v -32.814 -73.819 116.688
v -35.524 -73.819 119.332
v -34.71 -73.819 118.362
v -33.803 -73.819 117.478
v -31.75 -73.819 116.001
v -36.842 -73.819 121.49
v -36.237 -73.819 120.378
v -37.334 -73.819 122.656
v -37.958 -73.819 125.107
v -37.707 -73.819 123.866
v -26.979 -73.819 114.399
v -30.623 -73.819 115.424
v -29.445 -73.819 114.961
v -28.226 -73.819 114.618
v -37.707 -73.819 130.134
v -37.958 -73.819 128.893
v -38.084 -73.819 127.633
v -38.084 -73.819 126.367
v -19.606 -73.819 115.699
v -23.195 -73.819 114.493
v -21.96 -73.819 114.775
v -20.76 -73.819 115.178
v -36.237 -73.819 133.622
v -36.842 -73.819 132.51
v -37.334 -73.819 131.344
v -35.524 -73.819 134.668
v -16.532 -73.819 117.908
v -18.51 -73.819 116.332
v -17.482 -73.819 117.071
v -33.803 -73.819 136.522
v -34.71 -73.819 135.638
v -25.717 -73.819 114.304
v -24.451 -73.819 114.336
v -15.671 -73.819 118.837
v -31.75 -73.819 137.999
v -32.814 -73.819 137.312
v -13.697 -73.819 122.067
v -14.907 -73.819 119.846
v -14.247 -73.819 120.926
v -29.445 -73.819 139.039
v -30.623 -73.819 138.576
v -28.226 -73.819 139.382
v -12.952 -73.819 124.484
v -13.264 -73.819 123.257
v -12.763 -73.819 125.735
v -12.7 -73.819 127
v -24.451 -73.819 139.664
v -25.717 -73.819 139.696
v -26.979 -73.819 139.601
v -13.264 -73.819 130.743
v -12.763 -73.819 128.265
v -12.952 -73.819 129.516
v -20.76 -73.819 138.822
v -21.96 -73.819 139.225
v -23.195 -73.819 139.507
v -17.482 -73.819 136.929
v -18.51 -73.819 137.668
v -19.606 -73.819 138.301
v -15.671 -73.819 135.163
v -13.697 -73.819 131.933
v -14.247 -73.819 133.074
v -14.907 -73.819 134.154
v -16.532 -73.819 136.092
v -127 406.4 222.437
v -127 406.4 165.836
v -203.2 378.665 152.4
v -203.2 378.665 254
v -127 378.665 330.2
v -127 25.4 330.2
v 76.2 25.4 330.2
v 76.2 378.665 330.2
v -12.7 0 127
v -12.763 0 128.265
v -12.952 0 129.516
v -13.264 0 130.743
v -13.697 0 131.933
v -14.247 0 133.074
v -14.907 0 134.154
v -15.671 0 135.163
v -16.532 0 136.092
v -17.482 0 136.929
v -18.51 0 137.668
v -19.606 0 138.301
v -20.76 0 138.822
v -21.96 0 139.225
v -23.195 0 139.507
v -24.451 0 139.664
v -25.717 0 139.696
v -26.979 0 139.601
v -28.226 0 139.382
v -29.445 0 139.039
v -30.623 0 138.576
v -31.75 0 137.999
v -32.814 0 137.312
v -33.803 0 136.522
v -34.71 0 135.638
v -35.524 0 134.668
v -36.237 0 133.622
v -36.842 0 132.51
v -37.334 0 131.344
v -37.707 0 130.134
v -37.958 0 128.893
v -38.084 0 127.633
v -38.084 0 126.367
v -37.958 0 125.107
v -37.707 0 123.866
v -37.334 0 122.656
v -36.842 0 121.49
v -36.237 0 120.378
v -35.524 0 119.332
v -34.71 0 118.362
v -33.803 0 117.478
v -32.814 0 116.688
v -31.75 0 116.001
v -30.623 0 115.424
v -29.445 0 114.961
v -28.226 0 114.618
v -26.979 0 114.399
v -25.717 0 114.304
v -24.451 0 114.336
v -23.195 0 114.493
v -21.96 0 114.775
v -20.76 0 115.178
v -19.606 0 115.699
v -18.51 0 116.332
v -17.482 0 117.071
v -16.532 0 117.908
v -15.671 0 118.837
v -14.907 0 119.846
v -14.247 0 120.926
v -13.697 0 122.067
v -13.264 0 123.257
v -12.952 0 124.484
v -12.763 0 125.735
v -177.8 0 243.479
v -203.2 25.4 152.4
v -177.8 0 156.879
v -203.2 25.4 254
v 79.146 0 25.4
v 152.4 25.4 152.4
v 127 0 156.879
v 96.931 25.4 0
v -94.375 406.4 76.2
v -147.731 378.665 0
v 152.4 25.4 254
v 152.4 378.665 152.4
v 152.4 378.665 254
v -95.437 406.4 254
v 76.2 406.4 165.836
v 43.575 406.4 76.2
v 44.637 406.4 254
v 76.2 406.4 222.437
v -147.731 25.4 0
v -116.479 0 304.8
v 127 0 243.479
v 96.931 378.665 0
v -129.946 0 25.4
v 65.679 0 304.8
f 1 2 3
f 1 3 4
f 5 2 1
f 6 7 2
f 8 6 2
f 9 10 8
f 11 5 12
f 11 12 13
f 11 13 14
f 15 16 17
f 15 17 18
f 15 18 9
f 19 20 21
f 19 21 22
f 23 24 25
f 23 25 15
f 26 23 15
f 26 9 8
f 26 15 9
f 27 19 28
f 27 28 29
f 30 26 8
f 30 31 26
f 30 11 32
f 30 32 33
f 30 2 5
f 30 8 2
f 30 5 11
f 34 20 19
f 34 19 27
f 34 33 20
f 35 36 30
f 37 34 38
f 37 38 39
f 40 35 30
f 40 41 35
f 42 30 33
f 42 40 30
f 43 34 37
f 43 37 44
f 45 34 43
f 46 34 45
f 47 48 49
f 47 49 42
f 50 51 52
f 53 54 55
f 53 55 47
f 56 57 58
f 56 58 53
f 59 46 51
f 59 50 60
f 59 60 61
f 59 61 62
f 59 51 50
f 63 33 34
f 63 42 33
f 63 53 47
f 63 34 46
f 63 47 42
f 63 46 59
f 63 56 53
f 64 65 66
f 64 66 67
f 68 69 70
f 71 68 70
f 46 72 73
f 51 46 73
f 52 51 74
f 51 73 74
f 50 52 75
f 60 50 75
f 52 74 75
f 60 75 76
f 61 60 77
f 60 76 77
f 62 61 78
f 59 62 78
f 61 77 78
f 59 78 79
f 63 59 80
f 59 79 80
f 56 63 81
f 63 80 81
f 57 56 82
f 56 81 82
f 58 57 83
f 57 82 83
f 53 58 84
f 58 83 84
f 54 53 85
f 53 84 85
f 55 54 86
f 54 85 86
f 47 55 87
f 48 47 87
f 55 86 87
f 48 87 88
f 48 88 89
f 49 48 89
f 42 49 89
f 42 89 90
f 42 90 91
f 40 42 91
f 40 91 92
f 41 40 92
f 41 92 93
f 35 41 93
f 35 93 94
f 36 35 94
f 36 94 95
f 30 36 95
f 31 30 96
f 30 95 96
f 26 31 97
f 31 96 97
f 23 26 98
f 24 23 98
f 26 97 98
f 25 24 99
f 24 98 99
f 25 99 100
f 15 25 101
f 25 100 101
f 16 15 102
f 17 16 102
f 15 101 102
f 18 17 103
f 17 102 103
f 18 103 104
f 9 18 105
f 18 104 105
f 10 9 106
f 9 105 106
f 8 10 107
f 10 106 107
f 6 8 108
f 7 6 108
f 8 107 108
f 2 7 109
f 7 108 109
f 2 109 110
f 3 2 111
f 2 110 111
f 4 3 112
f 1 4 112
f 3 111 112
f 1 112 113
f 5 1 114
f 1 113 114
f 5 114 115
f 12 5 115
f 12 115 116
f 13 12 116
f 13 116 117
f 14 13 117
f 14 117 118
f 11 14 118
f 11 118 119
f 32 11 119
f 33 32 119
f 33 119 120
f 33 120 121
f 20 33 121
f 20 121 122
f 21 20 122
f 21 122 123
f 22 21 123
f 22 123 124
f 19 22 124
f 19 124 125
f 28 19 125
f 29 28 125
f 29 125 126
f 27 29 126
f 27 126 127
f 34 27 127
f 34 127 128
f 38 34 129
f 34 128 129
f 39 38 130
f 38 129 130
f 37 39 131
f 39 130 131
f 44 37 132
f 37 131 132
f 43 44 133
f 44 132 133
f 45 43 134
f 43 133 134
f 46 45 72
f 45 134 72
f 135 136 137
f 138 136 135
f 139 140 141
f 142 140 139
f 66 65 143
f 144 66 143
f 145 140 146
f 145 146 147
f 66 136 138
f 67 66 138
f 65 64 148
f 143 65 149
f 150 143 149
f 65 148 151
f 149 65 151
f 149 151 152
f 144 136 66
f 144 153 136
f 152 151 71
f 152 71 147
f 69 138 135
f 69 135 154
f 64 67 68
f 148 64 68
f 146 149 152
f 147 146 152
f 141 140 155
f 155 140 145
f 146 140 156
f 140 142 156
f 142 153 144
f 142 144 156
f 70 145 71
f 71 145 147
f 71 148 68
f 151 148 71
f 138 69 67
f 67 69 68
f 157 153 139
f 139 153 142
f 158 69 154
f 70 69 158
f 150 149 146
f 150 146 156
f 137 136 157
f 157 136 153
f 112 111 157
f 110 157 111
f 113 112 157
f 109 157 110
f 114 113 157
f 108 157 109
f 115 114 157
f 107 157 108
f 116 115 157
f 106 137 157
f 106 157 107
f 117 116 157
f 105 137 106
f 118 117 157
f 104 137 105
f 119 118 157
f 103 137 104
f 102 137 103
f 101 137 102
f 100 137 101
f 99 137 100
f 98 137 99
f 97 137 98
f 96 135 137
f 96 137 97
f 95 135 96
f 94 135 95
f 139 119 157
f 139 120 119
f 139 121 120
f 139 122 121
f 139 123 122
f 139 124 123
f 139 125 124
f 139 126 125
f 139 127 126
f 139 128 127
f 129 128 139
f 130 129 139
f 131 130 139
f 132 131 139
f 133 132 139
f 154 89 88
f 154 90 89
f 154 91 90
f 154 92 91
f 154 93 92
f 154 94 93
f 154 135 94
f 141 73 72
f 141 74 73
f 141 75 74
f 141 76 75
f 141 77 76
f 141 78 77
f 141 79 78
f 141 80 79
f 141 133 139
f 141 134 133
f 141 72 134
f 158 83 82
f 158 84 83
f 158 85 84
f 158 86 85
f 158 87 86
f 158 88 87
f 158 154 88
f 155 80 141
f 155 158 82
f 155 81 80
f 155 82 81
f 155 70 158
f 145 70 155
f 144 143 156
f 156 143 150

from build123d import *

# Parameters (mm, degrees)
F0_W       = 355.6
F0_H       = 330.2
F0_R       = 12.7
F1_DEPTH   = 406.4
F2_DEPTH   = 73.81875
F3_SIZE    = 76.2
F4_SIZE2   = 55.4690637022
F4_SIZE    = 152.4
F4_2_SIZE2 = 55.4690637022
F4_2_SIZE  = 152.4
F5_SIZE    = 25.4
F6_SIZE2   = 76.2
F6_SIZE    = 27.7345318511


with BuildPart() as f1:
    # F0 (on Front) → F1 (new body)
    with BuildSketch(Plane.XZ):
        with Locations((-25.4, 165.1)):
            Rectangle(F0_W, F0_H)
        with Locations((-25.4, 127)):
            Circle(F0_R, mode=Mode.SUBTRACT)
        with Locations((-25.4, 127)):
            Circle(F0_R)
    extrude(amount=-F1_DEPTH)

    # F0 (on Front) → F2 (join)
    with BuildSketch(Plane.XZ):
        with Locations((-25.4, 127)):
            Circle(F0_R)
    extrude(amount=F2_DEPTH)

    # F3
    f3_edges = [f1.edges().sort_by_distance(p)[0] for p in [
        (-203.2, 203.2, 330.2),
        (152.4, 203.2, 330.2),
    ]]
    chamfer(f3_edges, length=F3_SIZE)

    # F4
    f4_edges = [f1.edges().sort_by_distance(p)[0] for p in [
        (-203.2, 203.2, 0),
    ]]
    f4_side = f1.faces().sort_by_distance((-203.2, 203.2, 127))[0]
    chamfer(f4_edges, length=F4_SIZE, length2=F4_SIZE2, reference=f4_side)

    # F4#2
    f4_2_edges = [f1.edges().sort_by_distance(p)[0] for p in [
        (152.4, 203.2, 0),
    ]]
    f4_2_side = f1.faces().sort_by_distance((152.4, 203.2, 127))[0]
    chamfer(f4_2_edges, length=F4_2_SIZE, length2=F4_2_SIZE2, reference=f4_2_side)

    # F5
    f5_edges = [f1.edges().sort_by_distance(p)[0] for p in [
        (-165.1, 0, 292.1),
        (-203.2, 0, 203.2),
        (-175.465468, 0, 76.2),
        (-25.4, 0, 0),
        (124.665468, 0, 76.2),
        (152.4, 0, 203.2),
        (114.3, 0, 292.1),
        (-25.4, 0, 330.2),
    ]]
    chamfer(f5_edges, length=F5_SIZE)

    # F6
    f6_edges = [f1.edges().sort_by_distance(p)[0] for p in [
        (-175.465468, 406.4, 76.2),
        (-203.2, 406.4, 203.2),
        (-165.1, 406.4, 292.1),
        (-25.4, 406.4, 330.2),
        (-25.4, 406.4, 0),
        (124.665468, 406.4, 76.2),
        (152.4, 406.4, 203.2),
        (114.3, 406.4, 292.1),
    ]]
    chamfer(f6_edges, length=F6_SIZE, length2=F6_SIZE2)


solid = f1.part
